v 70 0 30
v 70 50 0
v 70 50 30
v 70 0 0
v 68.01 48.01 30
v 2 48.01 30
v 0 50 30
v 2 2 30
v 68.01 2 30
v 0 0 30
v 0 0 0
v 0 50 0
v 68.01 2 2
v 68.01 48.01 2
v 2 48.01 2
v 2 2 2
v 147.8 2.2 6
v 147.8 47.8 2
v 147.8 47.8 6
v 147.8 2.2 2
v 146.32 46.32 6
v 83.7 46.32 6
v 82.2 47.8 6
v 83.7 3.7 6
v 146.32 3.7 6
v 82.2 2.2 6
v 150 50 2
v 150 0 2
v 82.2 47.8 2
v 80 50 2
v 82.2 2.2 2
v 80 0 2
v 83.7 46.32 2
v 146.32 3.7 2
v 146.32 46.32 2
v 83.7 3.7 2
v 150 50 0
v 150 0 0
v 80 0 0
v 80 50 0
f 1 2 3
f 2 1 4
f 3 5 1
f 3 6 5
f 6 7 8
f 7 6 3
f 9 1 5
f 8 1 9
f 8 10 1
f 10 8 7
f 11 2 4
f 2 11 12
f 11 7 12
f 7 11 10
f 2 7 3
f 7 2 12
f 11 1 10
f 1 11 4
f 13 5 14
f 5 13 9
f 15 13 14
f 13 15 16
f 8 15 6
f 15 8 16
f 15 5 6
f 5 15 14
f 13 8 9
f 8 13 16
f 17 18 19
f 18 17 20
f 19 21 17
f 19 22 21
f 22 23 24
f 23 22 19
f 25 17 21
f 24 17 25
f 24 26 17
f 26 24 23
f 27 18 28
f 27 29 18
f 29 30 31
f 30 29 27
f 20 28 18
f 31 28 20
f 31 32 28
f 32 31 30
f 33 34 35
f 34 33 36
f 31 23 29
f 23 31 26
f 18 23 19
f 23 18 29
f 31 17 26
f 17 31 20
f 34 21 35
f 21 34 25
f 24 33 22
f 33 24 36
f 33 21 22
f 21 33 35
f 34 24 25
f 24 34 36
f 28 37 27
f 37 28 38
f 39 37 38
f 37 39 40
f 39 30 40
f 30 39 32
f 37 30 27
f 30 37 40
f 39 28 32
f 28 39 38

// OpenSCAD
// --- Parameters: Box ---
box_width = 70;          // Outer width (X)
box_depth = 50;          // Outer depth (Y)
box_height = 30;         // Outer height (Z)
box_wall_thick = 2;      // Wall thickness
box_floor_thick = 2;     // Floor thickness

// --- Parameters: Lid ---
lid_plate_thick = 2;     // Thickness of the base plate
lid_lip_thick = 1.5;     // Thickness of the vertical lip wall
lid_lip_height = 4;      // Height of the lip
lid_lip_outer_w = 65.6;  // Outer width of the lip (for clearance)
lid_lip_outer_d = 45.6;  // Outer depth of the lip (for clearance)

// --- Layout ---
gap = 10;                 // Gap between parts for printing
$fn = 64;                // Smoothness for curves

// --- Part 1: The Box ---
// Positioned at origin, resting on XY plane
module box() {
    difference() {
        // Main outer body
        cube([box_width, box_depth, box_height]);
        
        // Hollow interior
        // We subtract the interior volume, extending slightly to ensure clean cut
        translate([box_wall_thick, box_wall_thick, box_floor_thick])
            cube([
                box_width - (box_wall_thick * 2) + 0.01, 
                box_depth - (box_wall_thick * 2) + 0.01, 
                box_height // Extends past top
            ]);
    }
}

// --- Part 2: The Lid ---
// Printed upside down (lip facing down towards bed)
// Positioned on the +X side of the box
module lid() {
    // We model the lid as it sits on the bed (upside down)
    // The plate is on the bed, the lip is built "up" from the plate
    // But since it's "upside down", the lip is actually the part that 
        // would be the "top" of the lid when assembled.
    
    union() {
        // The base plate
        cube([box_width, box_depth, lid_plate_thick]);
        
        // The lip (modeled as a hollow rectangular frame)
        // To print upside down, we place the lip on top of the plate
        translate([
            (box_width - lid_lip_outer_w) / 2, 
            (box_depth - lid_lip_outer_d) / 2, 
            lid_plate_thick
        ])
        difference() {
            // Outer boundary of the lip
            cube([lid_lip_outer_w, lid_lip_outer_d, lid_lip_height]);
            
            // Inner boundary of the lip (lip_outer - 2 * lip_thick)
            translate([lid_lip_thick, lid_lip_thick, -0.01])
                cube([
                    lid_lip_outer_w - (lid_lip_thick * 2) + 0.02, 
                    lid_lip_outer_d - (lid_lip_thick * 2) + 0.02, 
                    lid_lip_height + 0.02
                ]);
        }
    }
}

// --- Assembly / Layout for Printing ---

// Render Box
translate([0, 0, 0]) 
    box();

// Render Lid (placed on +X side, flipped upside down)
// Note: The user asked for the lid to be "printed upside down" 
// and "a plate 70x50x2 lying on the bed, with a rectangular lip on top of it".
// This means the plate is the contact surface with the bed.
translate([box_width + gap, 0, 0]) 
    lid();
